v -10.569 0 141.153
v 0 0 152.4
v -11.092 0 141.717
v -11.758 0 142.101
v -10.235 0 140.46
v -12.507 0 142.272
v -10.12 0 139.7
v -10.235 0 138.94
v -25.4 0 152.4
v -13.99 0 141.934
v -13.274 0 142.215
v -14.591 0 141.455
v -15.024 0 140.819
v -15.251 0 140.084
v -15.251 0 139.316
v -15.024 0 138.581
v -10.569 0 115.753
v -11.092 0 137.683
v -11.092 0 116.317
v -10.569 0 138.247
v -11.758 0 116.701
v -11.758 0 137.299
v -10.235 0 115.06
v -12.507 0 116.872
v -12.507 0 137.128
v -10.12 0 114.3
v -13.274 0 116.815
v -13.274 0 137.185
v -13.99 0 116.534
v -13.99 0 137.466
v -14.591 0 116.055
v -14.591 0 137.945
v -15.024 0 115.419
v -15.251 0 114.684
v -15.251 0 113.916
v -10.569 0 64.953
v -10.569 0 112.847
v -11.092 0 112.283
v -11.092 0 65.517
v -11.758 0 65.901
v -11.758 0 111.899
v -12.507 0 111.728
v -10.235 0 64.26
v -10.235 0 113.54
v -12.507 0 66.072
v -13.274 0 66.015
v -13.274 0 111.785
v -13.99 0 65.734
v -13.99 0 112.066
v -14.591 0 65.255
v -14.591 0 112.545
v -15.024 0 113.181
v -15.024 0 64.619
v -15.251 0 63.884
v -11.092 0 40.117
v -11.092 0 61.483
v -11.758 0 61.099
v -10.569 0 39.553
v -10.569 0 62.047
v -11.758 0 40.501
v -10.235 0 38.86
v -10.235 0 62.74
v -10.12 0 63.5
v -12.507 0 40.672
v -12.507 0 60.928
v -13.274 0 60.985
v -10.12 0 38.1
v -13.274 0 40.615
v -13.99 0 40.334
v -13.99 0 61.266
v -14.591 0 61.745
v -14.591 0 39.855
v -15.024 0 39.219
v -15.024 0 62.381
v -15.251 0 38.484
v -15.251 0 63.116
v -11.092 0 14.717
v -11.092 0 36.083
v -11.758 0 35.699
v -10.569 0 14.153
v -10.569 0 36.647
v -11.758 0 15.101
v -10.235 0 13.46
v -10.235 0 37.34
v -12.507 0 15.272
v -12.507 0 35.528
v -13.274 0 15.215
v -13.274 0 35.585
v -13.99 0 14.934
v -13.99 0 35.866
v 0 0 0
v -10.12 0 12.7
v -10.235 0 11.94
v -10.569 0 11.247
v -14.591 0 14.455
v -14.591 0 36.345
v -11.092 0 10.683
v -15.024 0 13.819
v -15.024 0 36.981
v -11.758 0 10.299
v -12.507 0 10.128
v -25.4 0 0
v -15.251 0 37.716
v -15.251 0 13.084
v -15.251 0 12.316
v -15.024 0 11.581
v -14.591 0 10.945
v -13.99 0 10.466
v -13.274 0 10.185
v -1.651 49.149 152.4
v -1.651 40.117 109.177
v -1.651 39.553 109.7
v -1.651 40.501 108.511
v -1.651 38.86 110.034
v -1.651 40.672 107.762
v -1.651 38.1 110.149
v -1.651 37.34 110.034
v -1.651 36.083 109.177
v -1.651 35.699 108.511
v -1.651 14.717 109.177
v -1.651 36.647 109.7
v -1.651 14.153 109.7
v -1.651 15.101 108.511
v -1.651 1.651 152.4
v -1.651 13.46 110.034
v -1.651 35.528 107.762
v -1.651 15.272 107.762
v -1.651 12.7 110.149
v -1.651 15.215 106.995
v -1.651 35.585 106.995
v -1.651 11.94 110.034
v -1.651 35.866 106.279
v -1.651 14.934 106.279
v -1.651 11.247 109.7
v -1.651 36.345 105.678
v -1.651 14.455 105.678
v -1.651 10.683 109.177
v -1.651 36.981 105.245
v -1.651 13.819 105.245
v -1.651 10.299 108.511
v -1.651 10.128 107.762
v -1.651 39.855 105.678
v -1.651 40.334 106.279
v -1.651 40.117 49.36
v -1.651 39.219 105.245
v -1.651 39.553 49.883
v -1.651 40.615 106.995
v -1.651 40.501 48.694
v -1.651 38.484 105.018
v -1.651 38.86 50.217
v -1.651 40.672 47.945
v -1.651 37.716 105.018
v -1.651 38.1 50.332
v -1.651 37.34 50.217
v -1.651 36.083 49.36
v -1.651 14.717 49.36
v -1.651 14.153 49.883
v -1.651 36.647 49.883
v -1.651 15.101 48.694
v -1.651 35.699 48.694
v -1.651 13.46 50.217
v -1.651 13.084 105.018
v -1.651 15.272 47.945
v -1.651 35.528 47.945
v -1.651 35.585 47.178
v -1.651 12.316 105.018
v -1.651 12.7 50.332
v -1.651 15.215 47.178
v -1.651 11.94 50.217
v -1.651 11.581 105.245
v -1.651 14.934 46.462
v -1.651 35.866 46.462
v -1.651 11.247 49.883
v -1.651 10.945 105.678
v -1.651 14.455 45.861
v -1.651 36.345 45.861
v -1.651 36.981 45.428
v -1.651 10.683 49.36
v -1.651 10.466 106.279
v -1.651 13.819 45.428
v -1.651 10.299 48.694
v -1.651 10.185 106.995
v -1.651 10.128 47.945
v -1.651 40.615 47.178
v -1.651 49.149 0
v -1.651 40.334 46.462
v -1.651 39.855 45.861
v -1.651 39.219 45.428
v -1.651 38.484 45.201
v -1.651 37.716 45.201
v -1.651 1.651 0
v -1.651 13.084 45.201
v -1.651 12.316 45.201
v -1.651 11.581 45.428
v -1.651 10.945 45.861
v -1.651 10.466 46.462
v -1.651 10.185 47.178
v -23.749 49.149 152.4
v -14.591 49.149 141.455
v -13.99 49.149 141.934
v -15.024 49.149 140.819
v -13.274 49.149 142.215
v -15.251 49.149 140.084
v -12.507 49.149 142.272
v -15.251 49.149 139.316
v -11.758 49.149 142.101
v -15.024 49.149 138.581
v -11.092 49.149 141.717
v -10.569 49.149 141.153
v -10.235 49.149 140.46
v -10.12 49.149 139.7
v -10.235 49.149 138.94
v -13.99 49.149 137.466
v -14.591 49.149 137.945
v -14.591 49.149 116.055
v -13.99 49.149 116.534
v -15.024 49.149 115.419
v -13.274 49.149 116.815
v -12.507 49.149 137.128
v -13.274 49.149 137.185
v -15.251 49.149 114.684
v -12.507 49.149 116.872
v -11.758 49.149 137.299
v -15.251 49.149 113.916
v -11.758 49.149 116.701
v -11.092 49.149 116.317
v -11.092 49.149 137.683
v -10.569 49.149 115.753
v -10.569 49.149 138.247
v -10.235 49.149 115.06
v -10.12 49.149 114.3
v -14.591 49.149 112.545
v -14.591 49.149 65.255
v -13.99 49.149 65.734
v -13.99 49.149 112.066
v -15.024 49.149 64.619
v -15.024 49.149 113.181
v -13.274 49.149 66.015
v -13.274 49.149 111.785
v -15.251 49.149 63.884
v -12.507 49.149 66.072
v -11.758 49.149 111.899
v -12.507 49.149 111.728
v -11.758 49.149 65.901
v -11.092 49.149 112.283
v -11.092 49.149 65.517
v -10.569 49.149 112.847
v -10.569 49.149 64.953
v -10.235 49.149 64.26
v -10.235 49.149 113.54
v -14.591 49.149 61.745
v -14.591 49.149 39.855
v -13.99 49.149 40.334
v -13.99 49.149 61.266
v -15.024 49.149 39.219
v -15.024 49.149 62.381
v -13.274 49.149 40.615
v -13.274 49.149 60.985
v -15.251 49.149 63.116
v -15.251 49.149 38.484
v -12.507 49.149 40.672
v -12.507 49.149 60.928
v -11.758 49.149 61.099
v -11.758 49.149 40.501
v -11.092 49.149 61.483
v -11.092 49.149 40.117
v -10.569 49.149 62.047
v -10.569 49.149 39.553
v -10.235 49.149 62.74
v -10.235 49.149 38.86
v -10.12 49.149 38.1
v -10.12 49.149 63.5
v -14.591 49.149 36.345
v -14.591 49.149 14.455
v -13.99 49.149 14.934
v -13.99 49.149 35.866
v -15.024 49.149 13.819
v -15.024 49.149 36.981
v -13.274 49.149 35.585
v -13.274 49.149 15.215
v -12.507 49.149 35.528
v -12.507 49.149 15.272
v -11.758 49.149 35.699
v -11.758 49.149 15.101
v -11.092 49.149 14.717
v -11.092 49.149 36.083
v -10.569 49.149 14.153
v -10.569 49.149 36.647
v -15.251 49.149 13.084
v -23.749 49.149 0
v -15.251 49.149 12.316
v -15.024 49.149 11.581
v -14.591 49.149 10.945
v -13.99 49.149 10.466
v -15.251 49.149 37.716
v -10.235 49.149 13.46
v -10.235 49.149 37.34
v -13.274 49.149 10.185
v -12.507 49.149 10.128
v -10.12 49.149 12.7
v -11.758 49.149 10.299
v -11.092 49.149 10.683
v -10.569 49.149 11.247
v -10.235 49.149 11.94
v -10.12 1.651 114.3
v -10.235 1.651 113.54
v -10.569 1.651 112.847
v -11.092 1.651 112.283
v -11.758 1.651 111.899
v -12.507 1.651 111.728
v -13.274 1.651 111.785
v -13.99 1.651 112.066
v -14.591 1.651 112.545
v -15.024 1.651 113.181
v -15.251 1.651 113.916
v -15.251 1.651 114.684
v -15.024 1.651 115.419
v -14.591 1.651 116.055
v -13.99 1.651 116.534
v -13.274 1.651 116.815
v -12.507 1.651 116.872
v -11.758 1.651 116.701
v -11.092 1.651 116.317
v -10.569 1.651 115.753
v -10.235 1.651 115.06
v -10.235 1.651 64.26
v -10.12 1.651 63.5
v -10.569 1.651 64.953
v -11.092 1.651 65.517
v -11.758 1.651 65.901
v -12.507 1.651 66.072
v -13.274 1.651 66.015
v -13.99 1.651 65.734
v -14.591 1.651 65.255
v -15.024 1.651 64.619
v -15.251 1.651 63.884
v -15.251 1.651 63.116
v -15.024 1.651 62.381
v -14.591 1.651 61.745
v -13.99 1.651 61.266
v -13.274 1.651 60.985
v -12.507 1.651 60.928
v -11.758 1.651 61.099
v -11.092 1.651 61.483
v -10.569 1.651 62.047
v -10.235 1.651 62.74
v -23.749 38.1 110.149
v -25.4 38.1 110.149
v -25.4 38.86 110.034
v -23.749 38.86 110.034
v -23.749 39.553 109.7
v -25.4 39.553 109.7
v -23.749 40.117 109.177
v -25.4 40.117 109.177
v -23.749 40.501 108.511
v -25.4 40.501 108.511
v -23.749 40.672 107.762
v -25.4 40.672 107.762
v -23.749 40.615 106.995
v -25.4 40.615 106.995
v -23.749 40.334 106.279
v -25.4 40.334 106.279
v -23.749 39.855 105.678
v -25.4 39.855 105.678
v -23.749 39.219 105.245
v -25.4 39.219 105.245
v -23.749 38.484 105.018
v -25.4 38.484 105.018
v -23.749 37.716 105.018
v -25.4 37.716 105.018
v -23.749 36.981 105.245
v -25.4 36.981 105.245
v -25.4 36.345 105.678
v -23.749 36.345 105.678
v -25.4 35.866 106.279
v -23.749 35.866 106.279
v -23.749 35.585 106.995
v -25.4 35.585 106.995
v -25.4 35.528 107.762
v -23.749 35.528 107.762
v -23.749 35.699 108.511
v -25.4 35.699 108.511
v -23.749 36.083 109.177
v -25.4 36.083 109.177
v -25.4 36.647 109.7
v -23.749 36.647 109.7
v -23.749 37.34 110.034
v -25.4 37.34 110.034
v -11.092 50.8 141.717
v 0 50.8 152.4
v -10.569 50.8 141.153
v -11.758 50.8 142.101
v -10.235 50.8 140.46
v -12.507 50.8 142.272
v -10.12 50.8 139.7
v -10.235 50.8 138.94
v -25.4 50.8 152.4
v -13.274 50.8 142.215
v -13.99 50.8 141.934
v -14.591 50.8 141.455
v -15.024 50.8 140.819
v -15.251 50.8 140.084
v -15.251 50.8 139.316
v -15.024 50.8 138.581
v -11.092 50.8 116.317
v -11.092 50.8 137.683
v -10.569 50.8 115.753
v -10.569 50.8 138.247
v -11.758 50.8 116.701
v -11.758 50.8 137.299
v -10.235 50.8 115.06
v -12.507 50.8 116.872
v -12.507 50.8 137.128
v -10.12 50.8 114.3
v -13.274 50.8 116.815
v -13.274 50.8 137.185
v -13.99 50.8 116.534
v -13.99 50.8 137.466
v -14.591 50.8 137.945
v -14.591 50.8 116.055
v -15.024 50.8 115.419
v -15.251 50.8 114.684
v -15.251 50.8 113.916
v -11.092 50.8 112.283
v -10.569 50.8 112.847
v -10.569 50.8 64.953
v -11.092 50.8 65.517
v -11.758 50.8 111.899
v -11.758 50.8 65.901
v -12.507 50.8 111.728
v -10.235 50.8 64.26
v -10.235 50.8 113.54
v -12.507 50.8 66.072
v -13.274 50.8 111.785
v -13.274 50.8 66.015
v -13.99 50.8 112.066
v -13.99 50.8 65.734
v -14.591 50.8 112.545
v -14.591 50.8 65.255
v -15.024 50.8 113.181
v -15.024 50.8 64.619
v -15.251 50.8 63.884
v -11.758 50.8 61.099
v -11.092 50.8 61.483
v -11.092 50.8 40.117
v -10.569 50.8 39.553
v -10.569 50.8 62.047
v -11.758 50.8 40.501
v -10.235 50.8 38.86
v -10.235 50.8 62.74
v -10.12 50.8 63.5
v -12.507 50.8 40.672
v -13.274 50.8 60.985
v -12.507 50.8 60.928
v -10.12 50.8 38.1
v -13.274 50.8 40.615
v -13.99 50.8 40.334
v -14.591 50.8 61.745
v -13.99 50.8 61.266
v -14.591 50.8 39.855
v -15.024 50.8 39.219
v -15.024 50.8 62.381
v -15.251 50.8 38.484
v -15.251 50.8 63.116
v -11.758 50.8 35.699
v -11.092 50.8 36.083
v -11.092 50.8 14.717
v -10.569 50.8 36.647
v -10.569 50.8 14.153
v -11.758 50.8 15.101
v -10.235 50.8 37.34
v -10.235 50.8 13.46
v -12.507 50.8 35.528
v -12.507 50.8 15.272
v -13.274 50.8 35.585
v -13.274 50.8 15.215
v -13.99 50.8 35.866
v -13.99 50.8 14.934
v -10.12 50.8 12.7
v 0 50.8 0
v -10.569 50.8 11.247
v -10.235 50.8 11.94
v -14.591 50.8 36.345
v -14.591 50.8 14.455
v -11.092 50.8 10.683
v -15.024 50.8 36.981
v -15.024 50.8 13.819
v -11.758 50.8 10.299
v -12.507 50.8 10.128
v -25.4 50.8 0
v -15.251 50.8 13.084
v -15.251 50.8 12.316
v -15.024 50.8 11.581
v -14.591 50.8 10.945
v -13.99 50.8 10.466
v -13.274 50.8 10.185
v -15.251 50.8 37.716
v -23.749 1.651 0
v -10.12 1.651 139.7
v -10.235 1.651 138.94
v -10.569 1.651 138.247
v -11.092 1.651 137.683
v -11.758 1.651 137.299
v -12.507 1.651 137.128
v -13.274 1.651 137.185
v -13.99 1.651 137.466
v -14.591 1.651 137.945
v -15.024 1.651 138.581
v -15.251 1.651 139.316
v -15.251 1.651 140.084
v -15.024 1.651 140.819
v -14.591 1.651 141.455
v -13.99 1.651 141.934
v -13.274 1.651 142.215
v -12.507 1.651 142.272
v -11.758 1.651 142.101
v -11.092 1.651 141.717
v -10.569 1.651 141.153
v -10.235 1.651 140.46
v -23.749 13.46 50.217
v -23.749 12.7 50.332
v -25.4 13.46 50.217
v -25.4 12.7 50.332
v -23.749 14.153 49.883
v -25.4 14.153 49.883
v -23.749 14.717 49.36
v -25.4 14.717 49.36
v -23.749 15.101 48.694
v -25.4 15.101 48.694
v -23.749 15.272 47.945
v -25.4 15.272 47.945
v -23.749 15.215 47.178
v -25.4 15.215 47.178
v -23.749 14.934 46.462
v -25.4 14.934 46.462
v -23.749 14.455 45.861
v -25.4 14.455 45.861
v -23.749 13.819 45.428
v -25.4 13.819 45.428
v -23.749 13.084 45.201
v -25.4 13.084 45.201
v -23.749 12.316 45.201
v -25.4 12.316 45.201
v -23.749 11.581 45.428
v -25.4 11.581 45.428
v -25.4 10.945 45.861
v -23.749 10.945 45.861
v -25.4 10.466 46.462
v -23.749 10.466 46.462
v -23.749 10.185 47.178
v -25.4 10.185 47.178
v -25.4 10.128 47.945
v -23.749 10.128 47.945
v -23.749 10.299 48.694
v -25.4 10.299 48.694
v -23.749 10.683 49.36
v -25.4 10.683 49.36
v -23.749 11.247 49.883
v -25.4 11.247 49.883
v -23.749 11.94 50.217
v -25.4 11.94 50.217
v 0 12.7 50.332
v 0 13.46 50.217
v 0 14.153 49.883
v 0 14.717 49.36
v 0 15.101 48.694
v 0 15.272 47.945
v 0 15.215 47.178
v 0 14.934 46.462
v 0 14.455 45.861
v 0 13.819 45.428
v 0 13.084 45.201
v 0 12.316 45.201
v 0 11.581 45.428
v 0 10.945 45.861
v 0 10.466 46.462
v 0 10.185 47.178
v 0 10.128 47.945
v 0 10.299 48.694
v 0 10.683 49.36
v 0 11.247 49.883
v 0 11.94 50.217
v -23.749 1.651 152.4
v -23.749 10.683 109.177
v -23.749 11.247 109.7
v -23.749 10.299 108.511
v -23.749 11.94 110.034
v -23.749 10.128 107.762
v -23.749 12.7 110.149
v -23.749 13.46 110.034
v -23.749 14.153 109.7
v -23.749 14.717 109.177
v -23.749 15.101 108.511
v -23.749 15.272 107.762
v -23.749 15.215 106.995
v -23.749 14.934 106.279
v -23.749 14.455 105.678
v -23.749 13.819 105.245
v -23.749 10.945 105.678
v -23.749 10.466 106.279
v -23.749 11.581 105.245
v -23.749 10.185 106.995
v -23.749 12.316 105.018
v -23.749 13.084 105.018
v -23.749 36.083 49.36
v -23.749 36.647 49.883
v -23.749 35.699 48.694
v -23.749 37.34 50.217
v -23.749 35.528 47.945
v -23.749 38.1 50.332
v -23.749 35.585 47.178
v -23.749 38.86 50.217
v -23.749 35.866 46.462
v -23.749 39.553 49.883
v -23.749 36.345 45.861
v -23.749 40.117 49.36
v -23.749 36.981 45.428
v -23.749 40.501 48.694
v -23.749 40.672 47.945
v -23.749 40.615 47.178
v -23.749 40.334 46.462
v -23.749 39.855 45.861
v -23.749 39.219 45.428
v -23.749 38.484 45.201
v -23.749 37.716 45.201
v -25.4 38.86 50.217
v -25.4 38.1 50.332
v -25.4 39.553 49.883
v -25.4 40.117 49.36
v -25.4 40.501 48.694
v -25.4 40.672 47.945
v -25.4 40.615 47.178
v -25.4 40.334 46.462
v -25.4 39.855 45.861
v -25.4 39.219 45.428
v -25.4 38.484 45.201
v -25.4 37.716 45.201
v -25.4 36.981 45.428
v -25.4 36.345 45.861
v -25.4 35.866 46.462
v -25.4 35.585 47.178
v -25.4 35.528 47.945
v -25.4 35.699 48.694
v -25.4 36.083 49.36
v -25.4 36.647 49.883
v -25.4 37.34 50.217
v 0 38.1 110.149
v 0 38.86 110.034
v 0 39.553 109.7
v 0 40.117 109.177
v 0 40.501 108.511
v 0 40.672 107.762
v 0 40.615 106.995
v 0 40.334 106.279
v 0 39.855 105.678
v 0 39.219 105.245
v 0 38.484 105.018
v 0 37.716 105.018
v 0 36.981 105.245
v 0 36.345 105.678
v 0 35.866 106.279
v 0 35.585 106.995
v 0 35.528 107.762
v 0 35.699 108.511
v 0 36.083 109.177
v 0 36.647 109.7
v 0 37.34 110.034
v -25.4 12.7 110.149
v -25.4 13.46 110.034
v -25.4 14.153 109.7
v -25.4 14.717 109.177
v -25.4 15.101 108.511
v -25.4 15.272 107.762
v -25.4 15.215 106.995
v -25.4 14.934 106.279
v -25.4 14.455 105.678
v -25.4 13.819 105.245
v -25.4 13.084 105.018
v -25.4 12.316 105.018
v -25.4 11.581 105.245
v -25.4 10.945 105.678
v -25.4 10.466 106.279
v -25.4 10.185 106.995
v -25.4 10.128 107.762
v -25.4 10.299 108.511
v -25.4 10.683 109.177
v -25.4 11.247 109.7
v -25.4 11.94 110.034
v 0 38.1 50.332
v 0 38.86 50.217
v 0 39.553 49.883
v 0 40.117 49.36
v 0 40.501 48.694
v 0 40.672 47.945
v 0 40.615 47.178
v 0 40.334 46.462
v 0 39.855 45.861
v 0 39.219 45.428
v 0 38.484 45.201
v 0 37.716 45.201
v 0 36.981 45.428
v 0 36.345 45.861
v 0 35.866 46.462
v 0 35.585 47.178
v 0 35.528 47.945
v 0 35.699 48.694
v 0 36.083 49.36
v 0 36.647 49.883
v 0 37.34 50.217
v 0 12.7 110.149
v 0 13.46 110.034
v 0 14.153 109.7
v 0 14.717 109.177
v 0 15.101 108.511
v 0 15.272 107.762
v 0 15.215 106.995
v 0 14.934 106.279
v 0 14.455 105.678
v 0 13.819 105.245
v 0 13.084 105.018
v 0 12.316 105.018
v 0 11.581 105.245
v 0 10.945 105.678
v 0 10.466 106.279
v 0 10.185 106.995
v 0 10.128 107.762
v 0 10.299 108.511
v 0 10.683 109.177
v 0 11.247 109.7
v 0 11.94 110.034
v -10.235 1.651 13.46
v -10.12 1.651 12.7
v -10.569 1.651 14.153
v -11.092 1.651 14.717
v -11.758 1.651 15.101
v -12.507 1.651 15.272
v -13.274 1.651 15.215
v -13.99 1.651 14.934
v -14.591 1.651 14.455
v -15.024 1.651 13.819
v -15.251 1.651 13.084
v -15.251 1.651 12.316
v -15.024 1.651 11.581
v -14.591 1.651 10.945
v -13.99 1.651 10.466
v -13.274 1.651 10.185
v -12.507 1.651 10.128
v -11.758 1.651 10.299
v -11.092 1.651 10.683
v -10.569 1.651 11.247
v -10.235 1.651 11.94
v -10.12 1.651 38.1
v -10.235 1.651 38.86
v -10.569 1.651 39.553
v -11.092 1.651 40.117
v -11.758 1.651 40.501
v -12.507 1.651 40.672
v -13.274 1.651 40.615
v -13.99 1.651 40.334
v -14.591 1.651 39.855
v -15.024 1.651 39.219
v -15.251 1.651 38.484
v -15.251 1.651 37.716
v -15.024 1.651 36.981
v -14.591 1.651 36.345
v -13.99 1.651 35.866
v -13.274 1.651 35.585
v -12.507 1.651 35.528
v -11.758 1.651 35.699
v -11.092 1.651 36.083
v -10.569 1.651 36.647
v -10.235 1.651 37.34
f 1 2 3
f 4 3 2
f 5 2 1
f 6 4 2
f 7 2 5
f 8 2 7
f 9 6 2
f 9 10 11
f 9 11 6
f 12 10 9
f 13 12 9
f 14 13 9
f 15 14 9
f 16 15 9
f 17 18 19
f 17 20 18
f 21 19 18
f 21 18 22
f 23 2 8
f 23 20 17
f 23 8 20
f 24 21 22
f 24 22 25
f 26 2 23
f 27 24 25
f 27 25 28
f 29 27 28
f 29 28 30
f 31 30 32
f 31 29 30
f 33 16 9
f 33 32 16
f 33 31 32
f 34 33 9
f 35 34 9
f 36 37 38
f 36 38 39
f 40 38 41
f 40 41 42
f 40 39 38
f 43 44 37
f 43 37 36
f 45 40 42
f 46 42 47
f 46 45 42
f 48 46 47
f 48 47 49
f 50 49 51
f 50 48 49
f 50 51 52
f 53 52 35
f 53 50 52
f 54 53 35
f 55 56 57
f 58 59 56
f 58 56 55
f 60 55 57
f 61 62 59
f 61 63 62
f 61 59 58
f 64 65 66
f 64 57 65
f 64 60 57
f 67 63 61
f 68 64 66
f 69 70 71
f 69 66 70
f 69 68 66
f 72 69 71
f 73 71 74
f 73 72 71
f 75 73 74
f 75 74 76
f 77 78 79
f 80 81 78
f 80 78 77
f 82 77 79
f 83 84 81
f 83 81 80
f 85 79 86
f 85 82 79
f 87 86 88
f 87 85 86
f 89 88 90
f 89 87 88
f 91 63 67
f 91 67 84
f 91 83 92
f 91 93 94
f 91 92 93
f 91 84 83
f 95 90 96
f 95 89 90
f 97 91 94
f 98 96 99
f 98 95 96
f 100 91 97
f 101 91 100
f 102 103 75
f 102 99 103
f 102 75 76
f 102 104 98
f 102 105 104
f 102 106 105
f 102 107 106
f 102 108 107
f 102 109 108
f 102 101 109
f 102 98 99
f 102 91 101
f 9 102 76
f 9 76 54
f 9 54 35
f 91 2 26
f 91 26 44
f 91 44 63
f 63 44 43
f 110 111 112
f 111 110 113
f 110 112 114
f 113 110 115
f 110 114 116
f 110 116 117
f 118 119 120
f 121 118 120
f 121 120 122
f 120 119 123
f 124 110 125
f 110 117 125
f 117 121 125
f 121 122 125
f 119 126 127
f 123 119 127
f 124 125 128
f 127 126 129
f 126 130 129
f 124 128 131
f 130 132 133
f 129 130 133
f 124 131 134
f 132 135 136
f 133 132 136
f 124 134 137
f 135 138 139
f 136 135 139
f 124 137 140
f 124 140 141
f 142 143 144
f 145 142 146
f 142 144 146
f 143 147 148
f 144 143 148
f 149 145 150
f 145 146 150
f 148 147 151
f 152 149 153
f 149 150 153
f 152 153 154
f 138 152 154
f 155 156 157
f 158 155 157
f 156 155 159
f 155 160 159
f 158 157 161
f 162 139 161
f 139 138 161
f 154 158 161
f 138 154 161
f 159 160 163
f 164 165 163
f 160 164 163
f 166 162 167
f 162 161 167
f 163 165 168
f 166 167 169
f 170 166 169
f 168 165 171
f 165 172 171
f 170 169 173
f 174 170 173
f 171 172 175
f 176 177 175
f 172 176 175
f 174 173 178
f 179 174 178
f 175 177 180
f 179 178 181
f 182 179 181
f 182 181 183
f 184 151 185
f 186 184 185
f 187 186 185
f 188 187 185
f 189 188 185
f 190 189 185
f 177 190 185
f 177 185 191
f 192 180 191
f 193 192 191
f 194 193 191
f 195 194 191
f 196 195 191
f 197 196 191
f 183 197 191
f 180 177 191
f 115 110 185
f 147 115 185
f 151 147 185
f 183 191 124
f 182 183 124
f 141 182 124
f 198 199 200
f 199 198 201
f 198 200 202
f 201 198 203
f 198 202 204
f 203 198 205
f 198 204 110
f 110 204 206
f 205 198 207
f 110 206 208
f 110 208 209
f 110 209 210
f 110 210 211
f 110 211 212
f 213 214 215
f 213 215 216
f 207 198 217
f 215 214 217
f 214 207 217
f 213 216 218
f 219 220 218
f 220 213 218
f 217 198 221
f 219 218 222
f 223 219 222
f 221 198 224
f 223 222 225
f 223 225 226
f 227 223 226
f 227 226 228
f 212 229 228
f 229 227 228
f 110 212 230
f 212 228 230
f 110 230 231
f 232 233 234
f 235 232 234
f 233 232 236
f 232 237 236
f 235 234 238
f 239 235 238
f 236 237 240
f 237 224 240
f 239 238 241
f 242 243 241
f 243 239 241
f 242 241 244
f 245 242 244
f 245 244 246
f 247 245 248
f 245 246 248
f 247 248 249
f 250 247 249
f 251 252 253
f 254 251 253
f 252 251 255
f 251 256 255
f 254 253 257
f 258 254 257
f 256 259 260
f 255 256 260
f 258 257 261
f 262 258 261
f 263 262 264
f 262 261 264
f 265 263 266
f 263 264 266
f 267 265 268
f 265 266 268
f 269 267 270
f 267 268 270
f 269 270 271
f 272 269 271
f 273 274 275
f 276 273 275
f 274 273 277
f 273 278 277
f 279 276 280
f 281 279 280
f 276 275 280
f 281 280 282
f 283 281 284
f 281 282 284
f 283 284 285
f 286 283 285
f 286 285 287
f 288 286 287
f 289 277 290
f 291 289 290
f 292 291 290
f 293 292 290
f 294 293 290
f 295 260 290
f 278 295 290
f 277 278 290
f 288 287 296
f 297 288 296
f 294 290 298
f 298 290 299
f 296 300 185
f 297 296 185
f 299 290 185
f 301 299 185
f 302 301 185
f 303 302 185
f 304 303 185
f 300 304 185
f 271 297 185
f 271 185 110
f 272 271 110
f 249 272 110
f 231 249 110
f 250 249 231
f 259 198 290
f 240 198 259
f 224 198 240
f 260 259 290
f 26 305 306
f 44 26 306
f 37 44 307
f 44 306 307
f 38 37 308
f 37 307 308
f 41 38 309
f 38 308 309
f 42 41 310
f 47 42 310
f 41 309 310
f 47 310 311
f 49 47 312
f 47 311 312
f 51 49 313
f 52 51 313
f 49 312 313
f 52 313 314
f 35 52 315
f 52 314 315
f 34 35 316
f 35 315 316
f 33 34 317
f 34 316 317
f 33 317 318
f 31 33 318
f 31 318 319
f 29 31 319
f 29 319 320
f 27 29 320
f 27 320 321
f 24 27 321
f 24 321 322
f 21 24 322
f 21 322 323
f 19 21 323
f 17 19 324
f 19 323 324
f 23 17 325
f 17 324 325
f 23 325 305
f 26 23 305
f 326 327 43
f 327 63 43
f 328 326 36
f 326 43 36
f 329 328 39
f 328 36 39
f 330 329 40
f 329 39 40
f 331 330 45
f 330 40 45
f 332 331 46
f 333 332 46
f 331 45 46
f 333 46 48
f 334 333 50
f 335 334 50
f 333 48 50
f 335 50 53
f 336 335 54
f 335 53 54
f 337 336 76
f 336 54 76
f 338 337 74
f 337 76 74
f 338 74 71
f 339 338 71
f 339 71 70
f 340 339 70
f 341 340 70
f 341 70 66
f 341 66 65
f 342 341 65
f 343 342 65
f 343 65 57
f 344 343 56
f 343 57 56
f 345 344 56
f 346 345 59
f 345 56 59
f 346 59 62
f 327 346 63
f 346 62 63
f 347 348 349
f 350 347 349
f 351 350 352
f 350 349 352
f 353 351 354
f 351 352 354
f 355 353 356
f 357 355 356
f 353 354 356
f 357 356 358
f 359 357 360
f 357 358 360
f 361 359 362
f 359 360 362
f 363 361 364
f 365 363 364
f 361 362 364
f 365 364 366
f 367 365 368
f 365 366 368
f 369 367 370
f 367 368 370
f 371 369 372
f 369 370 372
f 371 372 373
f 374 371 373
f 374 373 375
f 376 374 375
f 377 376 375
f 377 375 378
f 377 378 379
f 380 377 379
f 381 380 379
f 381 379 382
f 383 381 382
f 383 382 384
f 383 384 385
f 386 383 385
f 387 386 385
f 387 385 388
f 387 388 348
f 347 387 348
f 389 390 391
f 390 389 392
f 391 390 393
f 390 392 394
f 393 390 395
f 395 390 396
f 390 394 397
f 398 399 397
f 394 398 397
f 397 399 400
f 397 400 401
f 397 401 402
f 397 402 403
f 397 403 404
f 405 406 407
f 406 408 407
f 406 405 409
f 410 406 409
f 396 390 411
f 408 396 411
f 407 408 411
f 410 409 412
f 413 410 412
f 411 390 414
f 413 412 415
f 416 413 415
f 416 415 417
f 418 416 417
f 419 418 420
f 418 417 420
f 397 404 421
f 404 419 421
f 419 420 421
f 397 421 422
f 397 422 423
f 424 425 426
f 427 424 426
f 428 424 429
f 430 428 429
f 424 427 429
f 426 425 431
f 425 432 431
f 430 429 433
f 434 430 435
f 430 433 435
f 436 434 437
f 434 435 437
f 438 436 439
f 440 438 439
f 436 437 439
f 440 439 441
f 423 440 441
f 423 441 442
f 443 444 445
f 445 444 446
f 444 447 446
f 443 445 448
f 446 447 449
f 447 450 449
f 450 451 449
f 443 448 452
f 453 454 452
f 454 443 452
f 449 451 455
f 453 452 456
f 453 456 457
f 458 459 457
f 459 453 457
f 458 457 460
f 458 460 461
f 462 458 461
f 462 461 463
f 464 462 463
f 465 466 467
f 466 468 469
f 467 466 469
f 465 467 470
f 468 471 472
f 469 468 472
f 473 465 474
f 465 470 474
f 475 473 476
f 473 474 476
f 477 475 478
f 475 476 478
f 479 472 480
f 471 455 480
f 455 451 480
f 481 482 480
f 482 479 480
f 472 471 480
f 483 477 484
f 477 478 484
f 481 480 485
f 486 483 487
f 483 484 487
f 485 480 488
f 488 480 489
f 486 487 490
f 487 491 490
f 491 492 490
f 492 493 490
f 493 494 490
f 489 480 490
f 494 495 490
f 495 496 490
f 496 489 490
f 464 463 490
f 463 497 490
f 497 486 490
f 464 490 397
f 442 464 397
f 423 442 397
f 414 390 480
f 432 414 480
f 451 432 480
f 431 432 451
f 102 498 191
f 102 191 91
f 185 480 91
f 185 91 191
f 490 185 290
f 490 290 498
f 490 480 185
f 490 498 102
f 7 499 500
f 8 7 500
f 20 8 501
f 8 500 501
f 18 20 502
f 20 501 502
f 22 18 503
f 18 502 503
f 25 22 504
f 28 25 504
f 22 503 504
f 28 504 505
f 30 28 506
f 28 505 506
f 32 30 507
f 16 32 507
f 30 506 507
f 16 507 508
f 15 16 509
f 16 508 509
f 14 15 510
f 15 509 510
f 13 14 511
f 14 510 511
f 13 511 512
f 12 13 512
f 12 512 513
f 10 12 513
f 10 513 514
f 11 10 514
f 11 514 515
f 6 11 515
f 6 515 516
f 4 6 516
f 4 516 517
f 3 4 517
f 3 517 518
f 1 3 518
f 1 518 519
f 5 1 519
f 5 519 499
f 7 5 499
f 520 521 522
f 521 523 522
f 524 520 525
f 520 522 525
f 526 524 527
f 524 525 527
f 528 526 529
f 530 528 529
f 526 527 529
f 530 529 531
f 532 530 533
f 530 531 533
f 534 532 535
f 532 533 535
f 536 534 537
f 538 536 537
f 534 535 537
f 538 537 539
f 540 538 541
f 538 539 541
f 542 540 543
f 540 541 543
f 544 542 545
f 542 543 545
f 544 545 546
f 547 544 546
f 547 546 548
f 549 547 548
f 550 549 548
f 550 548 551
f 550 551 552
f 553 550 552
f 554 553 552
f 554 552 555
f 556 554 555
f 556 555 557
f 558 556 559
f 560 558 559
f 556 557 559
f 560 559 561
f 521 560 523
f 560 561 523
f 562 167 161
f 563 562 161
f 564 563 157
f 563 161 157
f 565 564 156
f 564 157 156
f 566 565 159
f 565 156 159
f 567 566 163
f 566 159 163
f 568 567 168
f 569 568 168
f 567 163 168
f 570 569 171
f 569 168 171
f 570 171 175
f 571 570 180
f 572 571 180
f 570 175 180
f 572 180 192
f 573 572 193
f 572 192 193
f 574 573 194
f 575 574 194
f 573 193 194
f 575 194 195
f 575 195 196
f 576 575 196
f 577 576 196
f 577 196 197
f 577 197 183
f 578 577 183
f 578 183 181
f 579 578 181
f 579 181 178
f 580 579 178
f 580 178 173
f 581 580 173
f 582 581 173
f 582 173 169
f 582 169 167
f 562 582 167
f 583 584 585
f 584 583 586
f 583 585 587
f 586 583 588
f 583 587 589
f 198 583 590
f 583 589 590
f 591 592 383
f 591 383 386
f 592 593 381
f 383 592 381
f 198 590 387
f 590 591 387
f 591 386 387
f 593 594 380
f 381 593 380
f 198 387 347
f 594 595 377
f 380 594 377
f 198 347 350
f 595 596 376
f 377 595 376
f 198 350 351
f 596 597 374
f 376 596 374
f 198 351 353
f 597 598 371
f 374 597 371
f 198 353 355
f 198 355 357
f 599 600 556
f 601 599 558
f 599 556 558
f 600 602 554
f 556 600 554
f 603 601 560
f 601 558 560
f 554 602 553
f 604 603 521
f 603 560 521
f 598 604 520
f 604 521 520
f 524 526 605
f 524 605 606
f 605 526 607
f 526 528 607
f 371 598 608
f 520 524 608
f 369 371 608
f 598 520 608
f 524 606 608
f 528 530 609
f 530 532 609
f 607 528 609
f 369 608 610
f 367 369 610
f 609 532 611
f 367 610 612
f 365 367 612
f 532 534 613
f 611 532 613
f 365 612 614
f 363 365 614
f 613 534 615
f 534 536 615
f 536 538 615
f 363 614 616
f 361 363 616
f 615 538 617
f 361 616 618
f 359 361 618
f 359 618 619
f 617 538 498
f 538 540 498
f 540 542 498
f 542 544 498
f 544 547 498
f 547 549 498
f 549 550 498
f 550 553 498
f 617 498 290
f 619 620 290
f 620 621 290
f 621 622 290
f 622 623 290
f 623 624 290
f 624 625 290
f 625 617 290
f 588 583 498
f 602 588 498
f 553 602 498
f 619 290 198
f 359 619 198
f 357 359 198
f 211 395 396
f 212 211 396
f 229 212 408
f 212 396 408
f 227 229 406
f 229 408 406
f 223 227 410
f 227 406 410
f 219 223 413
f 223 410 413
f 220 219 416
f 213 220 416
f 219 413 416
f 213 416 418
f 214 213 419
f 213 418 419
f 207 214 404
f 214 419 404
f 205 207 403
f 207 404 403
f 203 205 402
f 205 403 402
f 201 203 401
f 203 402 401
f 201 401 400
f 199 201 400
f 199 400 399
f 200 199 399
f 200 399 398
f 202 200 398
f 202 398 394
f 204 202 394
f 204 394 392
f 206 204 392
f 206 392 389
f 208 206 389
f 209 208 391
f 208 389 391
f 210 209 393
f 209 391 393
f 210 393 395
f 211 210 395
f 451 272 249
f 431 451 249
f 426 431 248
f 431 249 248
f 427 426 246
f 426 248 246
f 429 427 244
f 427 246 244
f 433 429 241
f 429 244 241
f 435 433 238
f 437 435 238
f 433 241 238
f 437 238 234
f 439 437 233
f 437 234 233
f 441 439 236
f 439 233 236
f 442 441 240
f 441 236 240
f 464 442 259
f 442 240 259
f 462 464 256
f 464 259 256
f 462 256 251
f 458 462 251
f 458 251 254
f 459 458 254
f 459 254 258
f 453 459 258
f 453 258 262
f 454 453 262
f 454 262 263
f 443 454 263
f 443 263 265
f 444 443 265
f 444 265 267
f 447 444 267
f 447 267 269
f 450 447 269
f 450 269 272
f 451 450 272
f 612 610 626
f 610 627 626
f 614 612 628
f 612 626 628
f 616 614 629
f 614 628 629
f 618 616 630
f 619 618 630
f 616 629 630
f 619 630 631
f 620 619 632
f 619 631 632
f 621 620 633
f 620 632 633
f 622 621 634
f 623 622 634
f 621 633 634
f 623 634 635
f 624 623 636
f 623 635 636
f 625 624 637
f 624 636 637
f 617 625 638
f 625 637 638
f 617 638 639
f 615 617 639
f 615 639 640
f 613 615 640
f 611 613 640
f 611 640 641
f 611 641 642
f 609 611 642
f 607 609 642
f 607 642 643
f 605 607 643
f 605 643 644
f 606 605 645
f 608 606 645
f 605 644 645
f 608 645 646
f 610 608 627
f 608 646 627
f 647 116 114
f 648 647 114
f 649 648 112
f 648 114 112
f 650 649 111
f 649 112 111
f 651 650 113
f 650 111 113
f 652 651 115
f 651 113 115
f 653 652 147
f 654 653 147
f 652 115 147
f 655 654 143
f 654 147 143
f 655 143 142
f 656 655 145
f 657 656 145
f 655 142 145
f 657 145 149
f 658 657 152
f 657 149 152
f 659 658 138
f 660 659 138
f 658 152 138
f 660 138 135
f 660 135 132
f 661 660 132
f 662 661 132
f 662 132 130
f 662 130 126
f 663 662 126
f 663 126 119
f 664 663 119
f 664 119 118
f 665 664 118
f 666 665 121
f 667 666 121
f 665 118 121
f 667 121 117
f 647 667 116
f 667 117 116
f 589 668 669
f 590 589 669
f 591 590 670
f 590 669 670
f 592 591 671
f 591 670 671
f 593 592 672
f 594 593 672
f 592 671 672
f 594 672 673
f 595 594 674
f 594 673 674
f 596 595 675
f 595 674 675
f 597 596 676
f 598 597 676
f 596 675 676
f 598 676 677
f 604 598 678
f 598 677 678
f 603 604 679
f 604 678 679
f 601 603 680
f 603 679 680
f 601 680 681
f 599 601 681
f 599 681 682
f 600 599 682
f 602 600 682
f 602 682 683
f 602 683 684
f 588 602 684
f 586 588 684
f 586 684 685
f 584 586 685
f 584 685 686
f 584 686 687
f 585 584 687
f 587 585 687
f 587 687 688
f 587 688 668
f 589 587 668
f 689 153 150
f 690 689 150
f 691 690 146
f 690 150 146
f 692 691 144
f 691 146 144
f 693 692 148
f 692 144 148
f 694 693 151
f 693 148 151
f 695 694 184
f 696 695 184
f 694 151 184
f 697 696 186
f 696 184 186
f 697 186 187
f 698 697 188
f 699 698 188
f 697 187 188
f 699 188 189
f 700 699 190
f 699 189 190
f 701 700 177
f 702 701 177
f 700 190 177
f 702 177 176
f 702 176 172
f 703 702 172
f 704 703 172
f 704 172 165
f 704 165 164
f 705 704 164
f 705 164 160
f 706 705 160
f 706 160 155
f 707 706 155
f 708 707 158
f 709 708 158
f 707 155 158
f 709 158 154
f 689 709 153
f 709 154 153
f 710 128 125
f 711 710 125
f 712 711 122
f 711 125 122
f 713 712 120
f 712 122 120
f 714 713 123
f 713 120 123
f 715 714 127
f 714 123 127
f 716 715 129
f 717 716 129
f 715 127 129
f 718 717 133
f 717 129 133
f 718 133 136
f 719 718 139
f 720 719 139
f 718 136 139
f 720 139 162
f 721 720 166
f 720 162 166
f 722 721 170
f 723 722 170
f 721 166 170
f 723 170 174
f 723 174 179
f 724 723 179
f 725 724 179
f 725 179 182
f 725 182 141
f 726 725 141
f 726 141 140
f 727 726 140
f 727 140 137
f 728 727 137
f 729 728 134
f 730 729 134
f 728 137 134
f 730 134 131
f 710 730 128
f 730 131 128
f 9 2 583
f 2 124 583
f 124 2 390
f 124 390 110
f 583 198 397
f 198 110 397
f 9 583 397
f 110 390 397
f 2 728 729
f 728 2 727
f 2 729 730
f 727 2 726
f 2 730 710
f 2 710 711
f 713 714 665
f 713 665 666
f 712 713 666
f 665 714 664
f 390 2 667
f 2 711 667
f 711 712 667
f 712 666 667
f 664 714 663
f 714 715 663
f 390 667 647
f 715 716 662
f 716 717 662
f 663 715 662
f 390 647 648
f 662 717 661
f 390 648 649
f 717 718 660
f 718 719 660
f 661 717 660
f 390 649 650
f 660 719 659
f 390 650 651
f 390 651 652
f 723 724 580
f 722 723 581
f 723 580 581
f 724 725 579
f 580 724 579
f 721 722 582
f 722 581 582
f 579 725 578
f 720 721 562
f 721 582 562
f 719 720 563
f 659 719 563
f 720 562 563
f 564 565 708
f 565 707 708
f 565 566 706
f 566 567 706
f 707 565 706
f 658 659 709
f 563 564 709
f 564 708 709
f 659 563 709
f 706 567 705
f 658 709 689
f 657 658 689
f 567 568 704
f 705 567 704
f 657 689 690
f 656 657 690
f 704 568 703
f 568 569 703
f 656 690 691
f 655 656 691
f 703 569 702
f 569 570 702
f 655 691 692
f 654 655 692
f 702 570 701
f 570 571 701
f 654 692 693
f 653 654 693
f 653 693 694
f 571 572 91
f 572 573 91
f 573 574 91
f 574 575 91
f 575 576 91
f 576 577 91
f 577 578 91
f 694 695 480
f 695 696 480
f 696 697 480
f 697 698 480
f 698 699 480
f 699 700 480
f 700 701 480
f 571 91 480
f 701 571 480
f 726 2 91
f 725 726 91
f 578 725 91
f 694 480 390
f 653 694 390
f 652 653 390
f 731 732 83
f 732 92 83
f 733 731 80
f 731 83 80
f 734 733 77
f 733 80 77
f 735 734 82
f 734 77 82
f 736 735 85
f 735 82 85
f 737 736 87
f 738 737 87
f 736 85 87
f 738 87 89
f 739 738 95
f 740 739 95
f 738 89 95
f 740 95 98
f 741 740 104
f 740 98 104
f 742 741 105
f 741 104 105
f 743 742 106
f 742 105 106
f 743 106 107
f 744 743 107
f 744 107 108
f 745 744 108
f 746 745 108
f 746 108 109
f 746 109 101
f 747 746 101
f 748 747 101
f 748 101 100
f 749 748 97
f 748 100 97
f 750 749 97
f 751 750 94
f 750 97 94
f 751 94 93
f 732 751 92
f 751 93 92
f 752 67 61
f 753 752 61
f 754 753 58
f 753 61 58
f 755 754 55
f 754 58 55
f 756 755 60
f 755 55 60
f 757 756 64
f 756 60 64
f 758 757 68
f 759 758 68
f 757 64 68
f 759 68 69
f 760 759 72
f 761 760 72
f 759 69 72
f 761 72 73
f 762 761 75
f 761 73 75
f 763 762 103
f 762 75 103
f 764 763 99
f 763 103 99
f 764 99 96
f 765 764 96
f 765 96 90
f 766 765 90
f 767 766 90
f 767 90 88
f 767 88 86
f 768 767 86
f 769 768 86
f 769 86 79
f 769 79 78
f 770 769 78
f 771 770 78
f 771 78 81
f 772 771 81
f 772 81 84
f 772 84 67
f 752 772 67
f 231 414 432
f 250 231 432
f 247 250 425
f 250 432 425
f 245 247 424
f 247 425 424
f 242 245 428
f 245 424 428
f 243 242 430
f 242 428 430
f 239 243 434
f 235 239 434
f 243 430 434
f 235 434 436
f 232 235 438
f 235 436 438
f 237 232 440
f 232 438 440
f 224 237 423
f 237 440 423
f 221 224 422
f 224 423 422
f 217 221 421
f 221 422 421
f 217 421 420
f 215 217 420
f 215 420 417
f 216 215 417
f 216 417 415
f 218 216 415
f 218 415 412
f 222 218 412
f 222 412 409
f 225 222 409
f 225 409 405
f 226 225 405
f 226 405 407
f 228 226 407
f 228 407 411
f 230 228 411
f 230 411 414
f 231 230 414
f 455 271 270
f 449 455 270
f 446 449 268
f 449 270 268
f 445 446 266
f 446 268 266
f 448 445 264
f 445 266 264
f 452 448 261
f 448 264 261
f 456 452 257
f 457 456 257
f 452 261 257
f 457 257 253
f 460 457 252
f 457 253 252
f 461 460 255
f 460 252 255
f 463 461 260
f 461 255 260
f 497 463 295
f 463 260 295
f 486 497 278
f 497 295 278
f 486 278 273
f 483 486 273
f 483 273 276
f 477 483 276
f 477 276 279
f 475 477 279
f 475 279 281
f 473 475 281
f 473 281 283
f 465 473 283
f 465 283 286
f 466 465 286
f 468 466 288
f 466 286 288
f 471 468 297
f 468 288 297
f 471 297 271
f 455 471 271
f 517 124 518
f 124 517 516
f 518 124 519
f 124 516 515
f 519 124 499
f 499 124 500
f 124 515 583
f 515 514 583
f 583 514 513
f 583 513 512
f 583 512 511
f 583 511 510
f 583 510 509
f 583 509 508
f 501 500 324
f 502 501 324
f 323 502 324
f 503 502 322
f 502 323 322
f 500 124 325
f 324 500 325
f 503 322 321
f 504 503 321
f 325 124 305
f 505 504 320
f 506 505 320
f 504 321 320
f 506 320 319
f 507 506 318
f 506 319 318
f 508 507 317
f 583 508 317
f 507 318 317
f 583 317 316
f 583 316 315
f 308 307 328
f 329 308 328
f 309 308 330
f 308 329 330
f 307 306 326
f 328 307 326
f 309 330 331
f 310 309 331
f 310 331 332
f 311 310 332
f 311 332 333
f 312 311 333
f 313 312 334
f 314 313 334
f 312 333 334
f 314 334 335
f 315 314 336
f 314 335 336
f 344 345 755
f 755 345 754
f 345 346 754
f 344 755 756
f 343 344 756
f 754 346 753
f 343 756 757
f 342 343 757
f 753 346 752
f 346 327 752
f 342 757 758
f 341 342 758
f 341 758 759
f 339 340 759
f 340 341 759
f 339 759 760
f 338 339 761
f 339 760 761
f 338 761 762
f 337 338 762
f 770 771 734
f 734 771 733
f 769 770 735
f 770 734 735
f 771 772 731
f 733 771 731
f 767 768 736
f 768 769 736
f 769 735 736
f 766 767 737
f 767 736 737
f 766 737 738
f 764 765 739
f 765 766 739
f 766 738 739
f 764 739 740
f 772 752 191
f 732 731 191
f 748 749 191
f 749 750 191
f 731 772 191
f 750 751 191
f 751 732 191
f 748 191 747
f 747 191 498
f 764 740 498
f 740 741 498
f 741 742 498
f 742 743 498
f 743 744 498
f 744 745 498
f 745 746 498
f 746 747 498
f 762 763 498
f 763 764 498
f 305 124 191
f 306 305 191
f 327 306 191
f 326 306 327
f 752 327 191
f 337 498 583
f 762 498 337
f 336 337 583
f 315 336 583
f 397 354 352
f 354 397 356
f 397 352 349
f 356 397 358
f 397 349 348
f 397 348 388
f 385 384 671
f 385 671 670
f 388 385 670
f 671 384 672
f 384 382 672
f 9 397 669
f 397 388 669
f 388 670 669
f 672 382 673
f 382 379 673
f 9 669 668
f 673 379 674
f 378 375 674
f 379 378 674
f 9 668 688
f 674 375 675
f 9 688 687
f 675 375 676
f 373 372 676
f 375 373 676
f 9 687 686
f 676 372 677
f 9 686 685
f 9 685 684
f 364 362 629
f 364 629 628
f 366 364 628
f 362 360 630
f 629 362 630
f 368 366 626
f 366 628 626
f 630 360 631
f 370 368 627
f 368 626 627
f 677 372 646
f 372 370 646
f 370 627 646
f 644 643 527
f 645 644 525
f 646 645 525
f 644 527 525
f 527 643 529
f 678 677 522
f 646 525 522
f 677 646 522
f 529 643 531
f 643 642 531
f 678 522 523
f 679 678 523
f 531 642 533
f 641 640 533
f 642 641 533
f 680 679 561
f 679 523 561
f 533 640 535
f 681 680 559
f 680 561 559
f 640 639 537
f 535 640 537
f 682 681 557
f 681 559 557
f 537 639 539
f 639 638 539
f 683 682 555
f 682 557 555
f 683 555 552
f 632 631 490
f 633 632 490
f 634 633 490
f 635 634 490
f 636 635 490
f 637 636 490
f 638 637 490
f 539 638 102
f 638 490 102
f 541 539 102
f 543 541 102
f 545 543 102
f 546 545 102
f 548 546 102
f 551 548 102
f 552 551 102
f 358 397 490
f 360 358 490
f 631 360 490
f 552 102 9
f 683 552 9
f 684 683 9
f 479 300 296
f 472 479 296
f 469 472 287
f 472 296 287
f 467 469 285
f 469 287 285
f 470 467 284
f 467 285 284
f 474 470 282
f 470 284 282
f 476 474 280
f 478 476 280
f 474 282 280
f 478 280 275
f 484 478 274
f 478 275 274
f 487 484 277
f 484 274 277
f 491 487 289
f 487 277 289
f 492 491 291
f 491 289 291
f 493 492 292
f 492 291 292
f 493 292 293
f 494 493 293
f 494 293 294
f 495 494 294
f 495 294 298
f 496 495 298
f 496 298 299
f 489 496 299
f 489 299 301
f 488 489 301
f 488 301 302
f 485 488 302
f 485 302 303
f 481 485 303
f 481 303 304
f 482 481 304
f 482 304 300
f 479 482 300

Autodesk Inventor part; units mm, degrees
ref_plane "YZ Plane" through (0, 0, 0) normal (1, 0, 0) x (0, 1, 0)
ref_plane "XZ Plane" through (0, 0, 0) normal (0, 1, 0) x (-1, 0, 0)
ref_plane "XY Plane" through (0, 0, 0) normal (0, 0, 1) x (1, 0, 0)
ref_plane "Work Plane1" through (0, 0, 0) normal (0, 0, -1) x (-1, 0, 0)
sketch "Sketch20" plane through (0, 0, 0) normal (0, 0, -1) x (-1, 0, 0)
  line L0 (0, 0) -> (25.4, 0)
  line L1 (25.4, 0) -> (0, 0)
  line L2 (0, 0) -> (0, 50.8)
  line L3 (0, 50.8) -> (25.4, 50.8)
  line L4 (25.4, 50.8) -> (25.4, 0)
  line L5 (23.749, 49.149) -> (1.651, 49.149)
  line L6 (1.651, 49.149) -> (1.651, 1.651)
  line L7 (1.651, 1.651) -> (23.749, 1.651)
  line L8 (23.749, 1.651) -> (23.749, 49.149)
  line L9 (0, 0) -> (0, 50.8) projected
  dimension "d71" = 25.4
  dimension "d72" = 50.8
  dimension "d73" = 1.651
  dimension "d74" = 1.651
  dimension "d75" = 1.651
  dimension "d76" = 1.651
  dimension "d78" = 0
extrude "Extrusion16" add sketch "Sketch20" against normal blind 152.4
ref_plane "Work Plane4" through (76.2, 0, 0) normal (0, -1, 0) x (1, 0, 0)
sketch "Sketch21" plane through (76.2, 0, 0) normal (0, -1, 0) x (1, 0, 0)
  circle A0 centre (-38.1, 12.7) radius 2.5797
  circle A1 centre (-63.5, 12.7) radius 2.5797
  circle A2 centre (-88.9, 12.7) radius 2.5797
  circle A3 centre (-88.9, 38.1) radius 2.5797
  circle A4 centre (-88.9, 63.5) radius 2.5797
  line L0 (-76.2, 25.4) -> (0, 25.4) projected
  line L1 (-101.6, 0) -> (-101.6, 152.4) projected
  line L2 (-76.2, 25.4) -> (-76.2, 152.4) projected
  point P0 (-76.2, 0)
  dimension "d81" = 12.7
  dimension "d82" = 12.7
  dimension "d83" = 12.7
  dimension "d84" = 25.4
  dimension "d85" = 12.7
  dimension "d86" = 5.1594
  dimension "d87" = 5.1594
  dimension "d88" = 5.1594
  dimension "d89" = 25.4
  dimension "d90" = 25.4
  dimension "d91" = 25.4
  dimension "d92" = 5.1594
  dimension "d93" = 5.1594
  dimension "d94" = 12.7
  dimension "d95" = 12.7
extrude "Extrusion17" cut sketch "Sketch21" against normal blind 76.2
ref_plane "Work Plane3" through (-25.4, 0, 0) normal (-1, 0, 0) x (0, 0, 1)
sketch "Sketch26" plane through (-25.4, 0, 0) normal (-1, 0, 0) x (0, 0, 1)
  circle A0 centre (107.569, 38.1) radius 2.5797
  line L0 (152.4, 50.8) -> (152.4, 0) projected
  line L1 (0, 50.8) -> (152.4, 50.8) projected
  circle A1 centre (47.752, 38.1) radius 2.5797
  circle A2 centre (107.569, 12.7) radius 2.5797
  circle A3 centre (47.752, 12.7) radius 2.5797
  point P0 (0, 0)
  dimension "d122" = 5.1594
  dimension "d123" = 44.831
  dimension "d124" = 12.7
  dimension "d125" = 5.1594
  dimension "d126" = 59.817
  dimension "d129" = 25.4
  dimension "d130" = 5.1594
  dimension "d131" = 25.4
  dimension "d132" = 5.1594
  dimension "d143" = 12.7
extrude "Extrusion22" cut sketch "Sketch26" against normal blind 25.4
ref_plane "Work Plane2" through (76.2, 50.8, 25.4) normal (0, 1, 0) x (1, 0, 0)
sketch "Sketch27" plane through (76.2, 50.8, 25.4) normal (0, 1, 0) x (1, 0, 0)
  circle A0 centre (-88.9, -114.3) radius 2.5797
  circle A1 centre (-88.9, -88.9) radius 2.5797
  line L0 (-76.2, -127) -> (-101.6, -127) projected
  line L1 (-76.2, 0) -> (-76.2, -127) projected
  point P0 (-76.2, 25.4)
  dimension "d135" = 12.7
  dimension "d136" = 12.7
  dimension "d137" = 38.1
  dimension "d138" = 12.7
  dimension "d139" = 5.1594
  dimension "d140" = 5.1594
extrude "Extrusion23" cut sketch "Sketch27" against normal blind 50.8
equation "\"d74\" = d73"
equation "\"d75\" = d73"
equation "\"d76\" = d73"
equation "\"d87\" = d86"
equation "\"d88\" = d86"
equation "\"d92\" = d86"
equation "\"d93\" = d86"
equation "\"d125\" = d122"
equation "\"d130\" = d122"
equation "\"d132\" = d122"
equation "\"d140\" = d139"
properties part number "left arm"
